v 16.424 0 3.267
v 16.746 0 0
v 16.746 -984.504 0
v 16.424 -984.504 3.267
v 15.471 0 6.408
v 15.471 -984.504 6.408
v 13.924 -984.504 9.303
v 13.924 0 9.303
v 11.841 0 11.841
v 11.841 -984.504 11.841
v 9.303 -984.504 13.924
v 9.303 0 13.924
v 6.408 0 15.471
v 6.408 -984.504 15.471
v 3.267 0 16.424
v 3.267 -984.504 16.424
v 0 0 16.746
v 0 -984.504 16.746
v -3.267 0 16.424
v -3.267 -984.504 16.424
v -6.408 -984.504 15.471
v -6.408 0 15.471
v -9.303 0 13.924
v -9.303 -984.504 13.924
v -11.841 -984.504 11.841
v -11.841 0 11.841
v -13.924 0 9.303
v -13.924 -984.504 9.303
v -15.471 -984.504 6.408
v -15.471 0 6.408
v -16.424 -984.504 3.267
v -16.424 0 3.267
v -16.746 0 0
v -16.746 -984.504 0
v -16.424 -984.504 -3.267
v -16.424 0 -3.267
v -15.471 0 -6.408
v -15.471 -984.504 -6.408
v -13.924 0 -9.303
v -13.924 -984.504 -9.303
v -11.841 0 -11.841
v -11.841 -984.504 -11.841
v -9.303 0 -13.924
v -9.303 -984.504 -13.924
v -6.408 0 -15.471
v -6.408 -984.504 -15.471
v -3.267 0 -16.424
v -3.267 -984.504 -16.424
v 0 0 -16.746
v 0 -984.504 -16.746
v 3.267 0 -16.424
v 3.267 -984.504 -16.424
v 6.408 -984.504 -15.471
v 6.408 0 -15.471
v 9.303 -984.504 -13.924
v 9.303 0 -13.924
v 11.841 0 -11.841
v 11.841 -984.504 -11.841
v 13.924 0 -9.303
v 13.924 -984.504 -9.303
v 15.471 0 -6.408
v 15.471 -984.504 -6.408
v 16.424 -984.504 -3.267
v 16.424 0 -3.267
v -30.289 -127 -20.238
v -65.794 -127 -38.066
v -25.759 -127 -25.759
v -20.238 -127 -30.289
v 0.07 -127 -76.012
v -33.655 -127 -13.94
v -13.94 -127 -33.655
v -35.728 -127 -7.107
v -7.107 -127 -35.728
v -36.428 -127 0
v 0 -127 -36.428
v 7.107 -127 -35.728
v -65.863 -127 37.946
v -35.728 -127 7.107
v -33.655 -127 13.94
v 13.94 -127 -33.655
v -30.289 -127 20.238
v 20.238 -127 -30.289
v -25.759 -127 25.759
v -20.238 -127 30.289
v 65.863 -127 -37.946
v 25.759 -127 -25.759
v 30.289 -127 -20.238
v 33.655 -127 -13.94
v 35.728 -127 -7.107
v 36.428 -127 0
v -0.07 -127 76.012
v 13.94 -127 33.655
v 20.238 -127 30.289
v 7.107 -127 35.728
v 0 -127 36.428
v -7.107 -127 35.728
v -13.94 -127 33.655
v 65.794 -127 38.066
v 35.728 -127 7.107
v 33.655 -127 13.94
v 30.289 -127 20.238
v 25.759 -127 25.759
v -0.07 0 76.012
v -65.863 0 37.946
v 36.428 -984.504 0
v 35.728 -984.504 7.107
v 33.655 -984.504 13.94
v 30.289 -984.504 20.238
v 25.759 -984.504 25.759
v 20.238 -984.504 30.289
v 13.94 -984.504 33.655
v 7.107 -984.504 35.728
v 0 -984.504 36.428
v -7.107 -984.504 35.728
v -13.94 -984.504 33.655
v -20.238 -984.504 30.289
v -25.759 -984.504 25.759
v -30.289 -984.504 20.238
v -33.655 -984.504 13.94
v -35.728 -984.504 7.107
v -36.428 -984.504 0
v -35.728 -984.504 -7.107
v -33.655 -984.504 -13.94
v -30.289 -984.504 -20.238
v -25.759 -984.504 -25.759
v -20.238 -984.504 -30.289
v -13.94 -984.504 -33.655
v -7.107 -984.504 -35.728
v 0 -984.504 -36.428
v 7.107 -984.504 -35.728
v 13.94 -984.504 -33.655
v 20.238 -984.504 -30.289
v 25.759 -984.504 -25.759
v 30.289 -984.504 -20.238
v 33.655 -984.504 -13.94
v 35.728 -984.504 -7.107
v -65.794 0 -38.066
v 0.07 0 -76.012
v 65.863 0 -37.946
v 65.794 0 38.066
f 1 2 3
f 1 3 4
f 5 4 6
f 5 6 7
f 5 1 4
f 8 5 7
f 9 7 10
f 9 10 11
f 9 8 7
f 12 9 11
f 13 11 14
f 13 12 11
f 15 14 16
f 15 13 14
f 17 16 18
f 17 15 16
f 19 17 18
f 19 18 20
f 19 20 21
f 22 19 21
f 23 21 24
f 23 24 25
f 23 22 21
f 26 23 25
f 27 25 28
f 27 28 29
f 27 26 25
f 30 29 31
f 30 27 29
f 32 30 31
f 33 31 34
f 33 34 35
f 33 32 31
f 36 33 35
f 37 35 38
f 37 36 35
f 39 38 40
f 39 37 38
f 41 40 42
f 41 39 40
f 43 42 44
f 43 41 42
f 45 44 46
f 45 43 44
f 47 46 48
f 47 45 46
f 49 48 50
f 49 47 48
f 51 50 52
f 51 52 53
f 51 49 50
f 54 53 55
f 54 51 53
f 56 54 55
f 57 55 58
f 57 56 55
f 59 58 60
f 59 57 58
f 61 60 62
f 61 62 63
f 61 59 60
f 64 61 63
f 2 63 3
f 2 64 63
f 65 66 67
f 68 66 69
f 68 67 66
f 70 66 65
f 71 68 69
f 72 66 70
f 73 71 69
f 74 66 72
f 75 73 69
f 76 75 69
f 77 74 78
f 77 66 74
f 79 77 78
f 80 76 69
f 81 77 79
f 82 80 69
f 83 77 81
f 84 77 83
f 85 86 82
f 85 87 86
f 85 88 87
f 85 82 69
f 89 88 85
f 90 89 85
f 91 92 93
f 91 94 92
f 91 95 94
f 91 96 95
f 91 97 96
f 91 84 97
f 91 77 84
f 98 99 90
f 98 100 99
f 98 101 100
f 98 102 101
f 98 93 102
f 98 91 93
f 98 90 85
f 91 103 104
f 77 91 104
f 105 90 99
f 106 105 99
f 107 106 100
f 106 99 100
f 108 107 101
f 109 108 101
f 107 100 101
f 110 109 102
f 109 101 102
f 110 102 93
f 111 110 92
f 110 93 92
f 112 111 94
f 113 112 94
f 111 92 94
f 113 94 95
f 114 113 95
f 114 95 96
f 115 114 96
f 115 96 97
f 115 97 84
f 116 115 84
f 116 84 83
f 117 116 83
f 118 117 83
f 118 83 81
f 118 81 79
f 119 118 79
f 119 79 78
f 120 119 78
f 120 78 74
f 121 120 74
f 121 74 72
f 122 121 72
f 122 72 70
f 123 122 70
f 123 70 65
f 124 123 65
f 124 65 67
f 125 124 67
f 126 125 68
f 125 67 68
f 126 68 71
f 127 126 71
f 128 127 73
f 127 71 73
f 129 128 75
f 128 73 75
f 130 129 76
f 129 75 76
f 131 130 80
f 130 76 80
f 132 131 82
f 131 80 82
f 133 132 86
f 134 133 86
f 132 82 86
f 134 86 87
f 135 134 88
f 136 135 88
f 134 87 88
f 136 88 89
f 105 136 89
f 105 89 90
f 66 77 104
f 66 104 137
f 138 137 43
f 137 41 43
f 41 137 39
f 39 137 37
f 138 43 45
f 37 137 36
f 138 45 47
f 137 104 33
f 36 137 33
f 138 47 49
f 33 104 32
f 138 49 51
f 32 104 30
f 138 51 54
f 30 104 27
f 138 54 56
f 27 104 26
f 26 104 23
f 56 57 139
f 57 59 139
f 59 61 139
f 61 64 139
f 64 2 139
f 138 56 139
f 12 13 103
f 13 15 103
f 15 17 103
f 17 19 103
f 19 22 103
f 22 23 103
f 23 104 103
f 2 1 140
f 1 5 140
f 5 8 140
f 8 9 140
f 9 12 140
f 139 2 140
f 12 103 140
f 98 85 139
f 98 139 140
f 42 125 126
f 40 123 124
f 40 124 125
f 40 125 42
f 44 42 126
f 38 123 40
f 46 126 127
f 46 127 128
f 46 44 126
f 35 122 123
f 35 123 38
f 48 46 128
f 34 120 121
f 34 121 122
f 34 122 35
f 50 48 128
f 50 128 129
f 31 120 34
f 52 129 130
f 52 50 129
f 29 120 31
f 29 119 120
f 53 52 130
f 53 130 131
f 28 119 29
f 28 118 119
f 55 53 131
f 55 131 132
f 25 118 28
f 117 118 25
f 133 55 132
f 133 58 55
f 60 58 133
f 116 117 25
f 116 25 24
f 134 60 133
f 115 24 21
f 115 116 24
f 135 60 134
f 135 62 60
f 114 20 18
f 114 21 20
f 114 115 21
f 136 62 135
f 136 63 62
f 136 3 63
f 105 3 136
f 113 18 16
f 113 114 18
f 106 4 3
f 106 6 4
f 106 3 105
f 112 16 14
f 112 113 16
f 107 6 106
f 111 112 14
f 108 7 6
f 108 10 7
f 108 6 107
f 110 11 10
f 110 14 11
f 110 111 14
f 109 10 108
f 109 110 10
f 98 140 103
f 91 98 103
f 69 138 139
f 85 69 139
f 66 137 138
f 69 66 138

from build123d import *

# Parameters (mm, degrees)
F0_R     = 36.4281701053
F0_R_2   = 16.7456603081
F1_DEPTH = 984.504
F2_DEPTH = 127


# Not quite as in the source:
# - a feature of the source that left no trace in its solid (it failed there, or was rolled back) is left out
# - the program builds the solid bodies; features that only make, move or delete a surface that nothing else refers to are left out


with BuildPart() as f1:
    # F0 (on Front) → F1 (new body)
    with BuildSketch(Plane.XZ):
        Circle(F0_R)
        Circle(F0_R_2, mode=Mode.SUBTRACT)
    extrude(amount=F1_DEPTH)

    # F0 (on Front) → F2 (join)
    with BuildSketch(Plane.XZ):
        Polygon((0.0695483181, -76.0122935755), (65.8633513954, -37.9459161775), (65.7938030773, 38.0663773981), (-0.0695483181, 76.0122935755), (-65.8633513954, 37.9459161775), (-65.7938030773, -38.0663773981), align=None)
        Circle(F0_R, mode=Mode.SUBTRACT)
    extrude(amount=F2_DEPTH)


solid = f1.part
